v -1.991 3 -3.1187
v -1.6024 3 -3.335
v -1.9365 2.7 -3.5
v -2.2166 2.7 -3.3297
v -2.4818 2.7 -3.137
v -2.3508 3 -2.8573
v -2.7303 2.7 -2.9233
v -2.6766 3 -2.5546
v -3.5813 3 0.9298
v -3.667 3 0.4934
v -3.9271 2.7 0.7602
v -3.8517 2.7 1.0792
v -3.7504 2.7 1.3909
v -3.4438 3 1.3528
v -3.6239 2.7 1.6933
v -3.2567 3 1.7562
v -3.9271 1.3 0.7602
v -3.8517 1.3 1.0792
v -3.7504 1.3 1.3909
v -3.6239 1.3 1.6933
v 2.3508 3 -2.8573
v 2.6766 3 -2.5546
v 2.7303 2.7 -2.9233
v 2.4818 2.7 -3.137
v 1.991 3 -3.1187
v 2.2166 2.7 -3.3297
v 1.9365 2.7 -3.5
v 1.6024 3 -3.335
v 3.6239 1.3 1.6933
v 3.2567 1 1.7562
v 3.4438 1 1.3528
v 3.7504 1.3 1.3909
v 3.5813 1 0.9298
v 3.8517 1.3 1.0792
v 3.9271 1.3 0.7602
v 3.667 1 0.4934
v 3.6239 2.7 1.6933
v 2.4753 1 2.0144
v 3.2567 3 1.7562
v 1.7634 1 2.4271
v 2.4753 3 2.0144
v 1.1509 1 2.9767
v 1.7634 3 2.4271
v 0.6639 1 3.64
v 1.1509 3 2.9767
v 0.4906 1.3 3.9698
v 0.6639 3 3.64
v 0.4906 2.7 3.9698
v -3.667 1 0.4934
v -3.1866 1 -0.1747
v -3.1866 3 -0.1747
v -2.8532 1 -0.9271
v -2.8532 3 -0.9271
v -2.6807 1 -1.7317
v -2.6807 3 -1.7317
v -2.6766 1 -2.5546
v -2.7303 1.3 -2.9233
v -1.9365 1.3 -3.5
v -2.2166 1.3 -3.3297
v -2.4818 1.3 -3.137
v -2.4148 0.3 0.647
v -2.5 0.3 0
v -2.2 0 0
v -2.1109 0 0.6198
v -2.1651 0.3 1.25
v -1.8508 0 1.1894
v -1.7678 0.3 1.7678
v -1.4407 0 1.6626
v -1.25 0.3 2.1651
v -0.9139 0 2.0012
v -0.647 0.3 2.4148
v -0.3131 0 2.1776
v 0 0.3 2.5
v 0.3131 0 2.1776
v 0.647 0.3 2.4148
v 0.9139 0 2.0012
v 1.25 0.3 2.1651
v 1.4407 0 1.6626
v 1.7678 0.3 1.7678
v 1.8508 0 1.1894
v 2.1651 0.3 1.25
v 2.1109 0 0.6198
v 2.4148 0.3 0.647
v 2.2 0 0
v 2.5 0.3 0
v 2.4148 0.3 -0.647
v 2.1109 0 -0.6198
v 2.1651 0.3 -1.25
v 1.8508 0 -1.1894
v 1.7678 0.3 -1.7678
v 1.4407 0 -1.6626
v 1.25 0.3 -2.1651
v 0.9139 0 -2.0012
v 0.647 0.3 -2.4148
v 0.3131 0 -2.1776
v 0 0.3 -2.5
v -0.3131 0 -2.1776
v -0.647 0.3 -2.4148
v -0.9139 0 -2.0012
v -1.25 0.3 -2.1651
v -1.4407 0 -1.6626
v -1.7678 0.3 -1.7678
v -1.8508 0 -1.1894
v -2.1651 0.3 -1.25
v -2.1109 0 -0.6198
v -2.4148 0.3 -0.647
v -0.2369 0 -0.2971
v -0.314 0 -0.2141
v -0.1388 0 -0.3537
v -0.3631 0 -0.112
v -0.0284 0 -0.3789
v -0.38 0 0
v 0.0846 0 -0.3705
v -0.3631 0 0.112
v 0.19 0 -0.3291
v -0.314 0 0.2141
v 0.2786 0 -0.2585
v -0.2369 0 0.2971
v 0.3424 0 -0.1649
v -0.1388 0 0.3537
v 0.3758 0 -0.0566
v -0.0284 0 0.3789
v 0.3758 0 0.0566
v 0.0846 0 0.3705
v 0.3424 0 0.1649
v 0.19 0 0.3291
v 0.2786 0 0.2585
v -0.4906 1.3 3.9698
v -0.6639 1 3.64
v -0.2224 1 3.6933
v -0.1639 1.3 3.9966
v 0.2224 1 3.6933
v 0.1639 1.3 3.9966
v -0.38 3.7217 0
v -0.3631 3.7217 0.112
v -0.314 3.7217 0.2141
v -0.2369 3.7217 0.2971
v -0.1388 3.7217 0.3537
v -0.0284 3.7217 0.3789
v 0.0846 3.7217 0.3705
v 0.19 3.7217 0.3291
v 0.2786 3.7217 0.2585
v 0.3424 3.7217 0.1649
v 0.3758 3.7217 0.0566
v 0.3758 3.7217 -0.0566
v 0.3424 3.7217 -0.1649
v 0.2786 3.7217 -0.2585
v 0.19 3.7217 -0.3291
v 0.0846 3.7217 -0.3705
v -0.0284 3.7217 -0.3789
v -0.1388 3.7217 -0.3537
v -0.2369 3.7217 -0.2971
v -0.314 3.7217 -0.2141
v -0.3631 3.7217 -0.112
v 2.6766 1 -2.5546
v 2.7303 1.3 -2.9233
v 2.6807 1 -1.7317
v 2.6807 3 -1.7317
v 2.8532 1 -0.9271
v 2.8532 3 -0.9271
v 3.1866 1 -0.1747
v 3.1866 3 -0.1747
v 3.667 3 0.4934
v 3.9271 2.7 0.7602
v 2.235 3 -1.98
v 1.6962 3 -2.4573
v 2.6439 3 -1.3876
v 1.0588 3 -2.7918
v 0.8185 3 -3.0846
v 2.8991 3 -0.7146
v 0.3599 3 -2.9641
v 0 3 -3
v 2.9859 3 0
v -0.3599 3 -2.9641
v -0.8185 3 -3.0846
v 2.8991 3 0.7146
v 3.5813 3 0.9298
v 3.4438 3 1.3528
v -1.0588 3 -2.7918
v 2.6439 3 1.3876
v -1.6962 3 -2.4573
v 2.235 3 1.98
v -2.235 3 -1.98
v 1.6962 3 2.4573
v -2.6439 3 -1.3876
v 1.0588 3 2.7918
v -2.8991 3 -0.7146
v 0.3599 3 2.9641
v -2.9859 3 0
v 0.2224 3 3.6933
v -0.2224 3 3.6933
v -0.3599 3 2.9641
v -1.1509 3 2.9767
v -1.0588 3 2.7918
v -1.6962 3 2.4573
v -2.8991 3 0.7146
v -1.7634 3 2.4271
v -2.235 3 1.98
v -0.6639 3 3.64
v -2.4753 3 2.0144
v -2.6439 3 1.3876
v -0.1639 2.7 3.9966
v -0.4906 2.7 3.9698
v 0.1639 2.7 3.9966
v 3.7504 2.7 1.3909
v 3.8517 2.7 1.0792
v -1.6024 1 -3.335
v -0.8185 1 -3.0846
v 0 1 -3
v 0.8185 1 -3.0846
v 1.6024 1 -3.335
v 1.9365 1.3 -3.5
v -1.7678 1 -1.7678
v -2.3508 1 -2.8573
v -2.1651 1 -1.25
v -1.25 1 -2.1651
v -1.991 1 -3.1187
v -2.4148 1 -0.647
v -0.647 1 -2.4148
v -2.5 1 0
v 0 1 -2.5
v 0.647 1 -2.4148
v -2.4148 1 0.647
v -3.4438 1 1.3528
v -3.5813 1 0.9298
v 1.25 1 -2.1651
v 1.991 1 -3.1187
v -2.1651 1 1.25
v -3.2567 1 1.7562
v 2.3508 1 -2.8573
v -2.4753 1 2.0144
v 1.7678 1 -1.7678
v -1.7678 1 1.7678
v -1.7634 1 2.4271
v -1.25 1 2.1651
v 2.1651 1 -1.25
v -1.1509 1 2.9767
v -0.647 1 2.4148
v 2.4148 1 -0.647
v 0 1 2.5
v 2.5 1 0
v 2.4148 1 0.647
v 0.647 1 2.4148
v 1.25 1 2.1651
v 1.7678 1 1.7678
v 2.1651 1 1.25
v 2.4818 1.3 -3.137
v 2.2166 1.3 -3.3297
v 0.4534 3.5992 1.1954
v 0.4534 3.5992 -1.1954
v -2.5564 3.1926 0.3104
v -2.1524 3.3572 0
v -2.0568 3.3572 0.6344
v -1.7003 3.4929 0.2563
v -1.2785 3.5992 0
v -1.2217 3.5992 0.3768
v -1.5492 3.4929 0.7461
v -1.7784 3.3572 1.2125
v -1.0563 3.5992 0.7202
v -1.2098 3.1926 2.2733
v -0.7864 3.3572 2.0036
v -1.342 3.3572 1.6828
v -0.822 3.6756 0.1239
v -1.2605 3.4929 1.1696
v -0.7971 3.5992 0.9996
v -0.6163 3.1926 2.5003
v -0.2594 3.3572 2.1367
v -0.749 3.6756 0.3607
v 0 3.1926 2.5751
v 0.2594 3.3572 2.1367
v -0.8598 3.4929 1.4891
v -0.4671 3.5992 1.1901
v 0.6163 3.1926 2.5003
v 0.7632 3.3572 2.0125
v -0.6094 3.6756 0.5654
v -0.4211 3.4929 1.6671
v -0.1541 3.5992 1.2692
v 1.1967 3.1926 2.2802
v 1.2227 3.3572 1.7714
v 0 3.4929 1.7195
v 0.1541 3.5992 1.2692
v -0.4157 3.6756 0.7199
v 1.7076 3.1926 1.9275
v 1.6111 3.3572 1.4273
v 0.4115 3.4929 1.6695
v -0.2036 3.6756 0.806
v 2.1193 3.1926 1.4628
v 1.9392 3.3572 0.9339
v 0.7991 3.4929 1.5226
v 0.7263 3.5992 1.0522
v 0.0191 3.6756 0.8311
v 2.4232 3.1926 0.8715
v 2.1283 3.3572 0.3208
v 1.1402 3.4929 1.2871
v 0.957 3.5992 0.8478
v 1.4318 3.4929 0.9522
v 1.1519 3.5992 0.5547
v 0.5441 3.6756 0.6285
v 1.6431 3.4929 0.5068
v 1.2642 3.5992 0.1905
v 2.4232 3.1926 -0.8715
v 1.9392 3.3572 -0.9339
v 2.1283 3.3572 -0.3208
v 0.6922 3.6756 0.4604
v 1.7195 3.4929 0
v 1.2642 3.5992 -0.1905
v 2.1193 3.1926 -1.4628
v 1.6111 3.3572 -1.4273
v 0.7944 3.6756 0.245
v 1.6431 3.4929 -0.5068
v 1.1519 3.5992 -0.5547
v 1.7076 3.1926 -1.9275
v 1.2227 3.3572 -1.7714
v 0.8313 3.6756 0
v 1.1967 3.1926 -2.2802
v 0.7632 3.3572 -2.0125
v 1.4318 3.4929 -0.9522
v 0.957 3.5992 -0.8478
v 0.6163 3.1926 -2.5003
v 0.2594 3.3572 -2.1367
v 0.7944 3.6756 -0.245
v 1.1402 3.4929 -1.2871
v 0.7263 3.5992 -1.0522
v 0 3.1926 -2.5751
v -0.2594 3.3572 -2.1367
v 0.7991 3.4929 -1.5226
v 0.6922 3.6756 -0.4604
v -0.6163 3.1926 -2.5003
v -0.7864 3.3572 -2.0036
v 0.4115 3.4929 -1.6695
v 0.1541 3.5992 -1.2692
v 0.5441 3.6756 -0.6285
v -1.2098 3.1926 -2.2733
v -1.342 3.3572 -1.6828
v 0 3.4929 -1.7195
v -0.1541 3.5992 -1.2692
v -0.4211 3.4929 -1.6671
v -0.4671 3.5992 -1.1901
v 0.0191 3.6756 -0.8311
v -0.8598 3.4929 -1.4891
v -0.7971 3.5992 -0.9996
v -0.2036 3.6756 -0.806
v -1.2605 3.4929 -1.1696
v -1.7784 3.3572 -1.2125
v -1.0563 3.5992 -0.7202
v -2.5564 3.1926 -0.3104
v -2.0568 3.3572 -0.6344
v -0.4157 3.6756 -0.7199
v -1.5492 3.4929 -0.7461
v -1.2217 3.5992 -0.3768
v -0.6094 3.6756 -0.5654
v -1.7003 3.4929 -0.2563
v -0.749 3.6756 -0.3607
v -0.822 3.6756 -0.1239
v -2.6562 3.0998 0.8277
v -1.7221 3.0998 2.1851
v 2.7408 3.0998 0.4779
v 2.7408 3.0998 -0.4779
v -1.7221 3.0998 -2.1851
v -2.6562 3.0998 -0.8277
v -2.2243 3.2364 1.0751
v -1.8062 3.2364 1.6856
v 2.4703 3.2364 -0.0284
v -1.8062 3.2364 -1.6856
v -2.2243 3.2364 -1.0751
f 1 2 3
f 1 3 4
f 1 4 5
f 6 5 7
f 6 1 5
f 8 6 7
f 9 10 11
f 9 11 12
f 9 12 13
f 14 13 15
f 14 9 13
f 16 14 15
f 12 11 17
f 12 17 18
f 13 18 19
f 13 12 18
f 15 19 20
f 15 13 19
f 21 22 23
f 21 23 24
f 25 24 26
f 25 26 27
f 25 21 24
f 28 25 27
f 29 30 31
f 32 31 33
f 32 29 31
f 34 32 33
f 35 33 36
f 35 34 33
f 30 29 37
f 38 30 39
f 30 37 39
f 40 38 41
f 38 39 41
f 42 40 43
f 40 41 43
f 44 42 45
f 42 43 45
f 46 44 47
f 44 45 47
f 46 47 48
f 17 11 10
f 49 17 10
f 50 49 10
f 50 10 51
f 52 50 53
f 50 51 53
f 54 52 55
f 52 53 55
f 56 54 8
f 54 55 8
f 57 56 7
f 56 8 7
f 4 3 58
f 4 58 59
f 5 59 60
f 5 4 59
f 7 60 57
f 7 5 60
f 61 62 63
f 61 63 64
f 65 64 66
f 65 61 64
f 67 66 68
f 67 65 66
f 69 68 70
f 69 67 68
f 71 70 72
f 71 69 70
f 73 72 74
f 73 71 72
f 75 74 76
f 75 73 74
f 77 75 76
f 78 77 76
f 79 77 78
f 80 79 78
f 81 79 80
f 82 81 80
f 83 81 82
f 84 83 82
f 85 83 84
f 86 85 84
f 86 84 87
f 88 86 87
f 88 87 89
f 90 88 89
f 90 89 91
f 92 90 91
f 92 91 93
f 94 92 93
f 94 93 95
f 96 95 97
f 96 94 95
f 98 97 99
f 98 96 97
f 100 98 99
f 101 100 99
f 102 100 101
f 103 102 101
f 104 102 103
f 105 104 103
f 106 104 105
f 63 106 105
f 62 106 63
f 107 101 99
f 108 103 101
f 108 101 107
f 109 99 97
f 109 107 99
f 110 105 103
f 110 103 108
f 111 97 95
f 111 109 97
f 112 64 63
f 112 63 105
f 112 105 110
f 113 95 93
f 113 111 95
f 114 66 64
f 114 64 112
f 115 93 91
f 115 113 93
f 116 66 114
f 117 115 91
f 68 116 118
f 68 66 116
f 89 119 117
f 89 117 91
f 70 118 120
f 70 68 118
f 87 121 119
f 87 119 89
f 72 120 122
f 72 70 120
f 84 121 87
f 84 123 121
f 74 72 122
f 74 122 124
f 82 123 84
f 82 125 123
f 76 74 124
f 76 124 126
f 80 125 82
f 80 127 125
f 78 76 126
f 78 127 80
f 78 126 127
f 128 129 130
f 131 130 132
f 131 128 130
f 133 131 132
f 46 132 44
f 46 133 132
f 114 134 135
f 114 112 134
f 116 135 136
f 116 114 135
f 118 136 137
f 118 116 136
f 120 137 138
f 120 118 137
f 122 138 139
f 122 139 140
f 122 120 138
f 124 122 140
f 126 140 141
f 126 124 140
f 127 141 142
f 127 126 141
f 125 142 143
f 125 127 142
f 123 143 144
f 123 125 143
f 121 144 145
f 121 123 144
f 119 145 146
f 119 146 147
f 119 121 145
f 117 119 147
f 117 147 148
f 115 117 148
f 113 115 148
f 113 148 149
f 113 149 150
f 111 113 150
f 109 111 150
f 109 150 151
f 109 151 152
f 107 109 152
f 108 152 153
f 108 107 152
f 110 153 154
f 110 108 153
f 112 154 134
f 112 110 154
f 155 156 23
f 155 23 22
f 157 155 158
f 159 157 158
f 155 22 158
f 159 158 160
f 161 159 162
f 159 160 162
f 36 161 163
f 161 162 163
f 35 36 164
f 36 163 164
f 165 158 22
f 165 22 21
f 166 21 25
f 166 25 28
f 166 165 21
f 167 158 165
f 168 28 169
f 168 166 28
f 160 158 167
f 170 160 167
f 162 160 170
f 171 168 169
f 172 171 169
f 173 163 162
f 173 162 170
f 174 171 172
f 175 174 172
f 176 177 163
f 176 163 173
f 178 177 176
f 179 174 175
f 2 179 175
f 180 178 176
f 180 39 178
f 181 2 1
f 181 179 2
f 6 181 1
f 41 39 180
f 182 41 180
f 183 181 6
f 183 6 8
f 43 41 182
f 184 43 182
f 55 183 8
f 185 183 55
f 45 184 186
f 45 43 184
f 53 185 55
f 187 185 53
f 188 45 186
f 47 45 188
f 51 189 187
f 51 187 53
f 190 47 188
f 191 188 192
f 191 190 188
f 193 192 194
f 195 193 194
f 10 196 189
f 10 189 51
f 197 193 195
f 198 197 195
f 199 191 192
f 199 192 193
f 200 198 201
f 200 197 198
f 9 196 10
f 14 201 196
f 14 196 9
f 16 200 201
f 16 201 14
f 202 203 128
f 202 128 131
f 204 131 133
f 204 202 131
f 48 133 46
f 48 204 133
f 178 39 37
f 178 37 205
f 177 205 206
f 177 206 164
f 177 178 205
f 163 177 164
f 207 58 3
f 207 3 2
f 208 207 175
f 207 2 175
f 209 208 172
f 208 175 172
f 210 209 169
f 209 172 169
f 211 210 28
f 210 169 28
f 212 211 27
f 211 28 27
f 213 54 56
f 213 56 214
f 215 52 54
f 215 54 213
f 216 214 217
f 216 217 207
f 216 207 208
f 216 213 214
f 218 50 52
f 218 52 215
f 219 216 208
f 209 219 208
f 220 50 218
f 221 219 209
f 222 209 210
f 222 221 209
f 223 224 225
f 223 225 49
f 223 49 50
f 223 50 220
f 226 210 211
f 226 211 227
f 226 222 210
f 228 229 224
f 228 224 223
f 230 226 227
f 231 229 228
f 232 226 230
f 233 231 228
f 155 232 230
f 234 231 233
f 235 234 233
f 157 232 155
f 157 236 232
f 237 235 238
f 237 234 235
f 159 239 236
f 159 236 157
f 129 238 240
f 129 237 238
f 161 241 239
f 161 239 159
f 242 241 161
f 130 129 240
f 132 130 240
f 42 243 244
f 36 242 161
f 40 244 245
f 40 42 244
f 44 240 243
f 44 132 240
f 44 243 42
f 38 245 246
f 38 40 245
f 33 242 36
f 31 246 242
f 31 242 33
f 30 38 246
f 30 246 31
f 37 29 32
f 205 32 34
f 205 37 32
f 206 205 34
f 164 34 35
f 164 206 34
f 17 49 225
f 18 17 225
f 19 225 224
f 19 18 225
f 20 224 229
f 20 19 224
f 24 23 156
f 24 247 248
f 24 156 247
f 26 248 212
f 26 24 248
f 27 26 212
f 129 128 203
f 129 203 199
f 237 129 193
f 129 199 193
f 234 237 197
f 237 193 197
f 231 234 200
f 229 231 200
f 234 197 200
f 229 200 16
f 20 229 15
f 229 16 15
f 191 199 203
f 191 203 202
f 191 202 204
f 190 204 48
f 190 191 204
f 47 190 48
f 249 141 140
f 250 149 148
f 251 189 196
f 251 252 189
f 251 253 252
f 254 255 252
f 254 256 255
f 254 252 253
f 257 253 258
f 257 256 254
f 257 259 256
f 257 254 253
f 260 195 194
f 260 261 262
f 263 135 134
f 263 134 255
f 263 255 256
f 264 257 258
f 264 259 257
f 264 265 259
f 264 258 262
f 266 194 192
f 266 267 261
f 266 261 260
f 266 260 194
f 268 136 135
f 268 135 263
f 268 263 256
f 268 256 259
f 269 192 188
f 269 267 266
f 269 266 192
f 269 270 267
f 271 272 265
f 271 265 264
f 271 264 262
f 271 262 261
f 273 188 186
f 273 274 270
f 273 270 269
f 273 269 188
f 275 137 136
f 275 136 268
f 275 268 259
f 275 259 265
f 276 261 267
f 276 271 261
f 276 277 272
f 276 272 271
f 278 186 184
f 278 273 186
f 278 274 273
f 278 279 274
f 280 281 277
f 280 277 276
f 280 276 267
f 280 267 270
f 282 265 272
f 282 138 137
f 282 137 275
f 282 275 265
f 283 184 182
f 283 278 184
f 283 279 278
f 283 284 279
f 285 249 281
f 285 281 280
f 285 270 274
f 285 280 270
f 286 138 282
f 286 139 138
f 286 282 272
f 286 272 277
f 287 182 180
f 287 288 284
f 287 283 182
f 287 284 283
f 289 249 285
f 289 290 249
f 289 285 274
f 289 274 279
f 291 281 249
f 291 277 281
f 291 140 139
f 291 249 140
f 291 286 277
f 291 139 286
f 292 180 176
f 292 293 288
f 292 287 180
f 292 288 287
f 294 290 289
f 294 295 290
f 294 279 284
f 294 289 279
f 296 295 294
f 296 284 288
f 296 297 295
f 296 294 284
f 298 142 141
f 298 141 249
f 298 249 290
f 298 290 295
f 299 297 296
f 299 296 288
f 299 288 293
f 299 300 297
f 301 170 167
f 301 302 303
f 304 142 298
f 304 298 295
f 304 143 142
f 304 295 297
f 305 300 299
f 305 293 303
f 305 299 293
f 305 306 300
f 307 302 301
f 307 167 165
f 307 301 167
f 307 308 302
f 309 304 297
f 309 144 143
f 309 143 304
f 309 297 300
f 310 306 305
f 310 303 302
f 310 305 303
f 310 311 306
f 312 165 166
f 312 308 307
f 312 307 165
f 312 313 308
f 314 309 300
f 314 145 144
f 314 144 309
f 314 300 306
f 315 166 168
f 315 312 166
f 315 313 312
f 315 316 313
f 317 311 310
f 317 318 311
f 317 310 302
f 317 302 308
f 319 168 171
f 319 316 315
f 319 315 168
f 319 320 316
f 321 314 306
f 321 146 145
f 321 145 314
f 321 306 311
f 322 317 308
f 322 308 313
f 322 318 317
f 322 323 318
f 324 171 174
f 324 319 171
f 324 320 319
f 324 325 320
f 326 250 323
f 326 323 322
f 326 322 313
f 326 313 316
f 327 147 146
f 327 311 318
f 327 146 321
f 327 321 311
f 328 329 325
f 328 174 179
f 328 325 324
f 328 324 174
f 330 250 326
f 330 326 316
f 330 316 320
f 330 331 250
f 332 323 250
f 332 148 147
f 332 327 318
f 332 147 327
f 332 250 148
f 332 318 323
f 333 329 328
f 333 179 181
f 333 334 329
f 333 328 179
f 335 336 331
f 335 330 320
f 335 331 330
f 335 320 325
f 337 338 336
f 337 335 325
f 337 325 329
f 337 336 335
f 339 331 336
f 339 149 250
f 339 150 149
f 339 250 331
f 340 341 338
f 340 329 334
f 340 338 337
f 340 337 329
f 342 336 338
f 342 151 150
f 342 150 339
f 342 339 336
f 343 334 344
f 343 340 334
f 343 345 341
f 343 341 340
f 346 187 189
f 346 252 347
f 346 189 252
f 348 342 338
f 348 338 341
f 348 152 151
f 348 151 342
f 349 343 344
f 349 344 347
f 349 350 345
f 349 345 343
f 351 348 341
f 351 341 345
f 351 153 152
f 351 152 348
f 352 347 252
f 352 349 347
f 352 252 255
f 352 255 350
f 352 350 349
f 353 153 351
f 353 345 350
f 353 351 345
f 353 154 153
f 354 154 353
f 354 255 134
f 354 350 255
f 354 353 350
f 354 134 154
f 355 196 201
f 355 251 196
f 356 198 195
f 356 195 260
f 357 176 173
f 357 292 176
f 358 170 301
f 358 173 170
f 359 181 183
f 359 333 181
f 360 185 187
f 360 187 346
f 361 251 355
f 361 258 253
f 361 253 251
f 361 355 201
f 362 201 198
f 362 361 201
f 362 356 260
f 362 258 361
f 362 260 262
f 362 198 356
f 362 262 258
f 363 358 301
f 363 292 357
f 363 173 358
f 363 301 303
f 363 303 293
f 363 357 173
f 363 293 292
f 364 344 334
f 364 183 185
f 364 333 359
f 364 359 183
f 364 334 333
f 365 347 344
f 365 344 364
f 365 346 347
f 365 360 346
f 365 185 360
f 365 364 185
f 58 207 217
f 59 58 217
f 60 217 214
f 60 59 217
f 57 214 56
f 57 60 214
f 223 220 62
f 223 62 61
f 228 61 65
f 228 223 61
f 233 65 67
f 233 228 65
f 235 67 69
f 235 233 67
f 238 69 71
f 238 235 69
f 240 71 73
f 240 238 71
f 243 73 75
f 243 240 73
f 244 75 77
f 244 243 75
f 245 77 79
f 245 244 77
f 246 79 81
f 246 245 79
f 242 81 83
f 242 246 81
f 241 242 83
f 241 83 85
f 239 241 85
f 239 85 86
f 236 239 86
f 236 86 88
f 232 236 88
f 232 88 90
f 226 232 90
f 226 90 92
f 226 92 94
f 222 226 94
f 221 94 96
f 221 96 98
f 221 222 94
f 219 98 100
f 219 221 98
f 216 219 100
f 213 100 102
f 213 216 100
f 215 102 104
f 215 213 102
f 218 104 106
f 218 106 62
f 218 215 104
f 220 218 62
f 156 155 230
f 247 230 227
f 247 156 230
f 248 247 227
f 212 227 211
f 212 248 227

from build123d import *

# Parameters (mm, degrees)
CHANFREIN1_SIZE              = 0.3
ESQUISSE2_R                  = 4
ENL_V_MAT_EXTRU_1_DEPTH      = 2
R_P_TITION_CIRCULAIRE1_COUNT = 5


with BuildPart() as part:
    # Esquisse1 → Révolution1 (revolve)
    with BuildSketch(Plane.XY):
        with BuildLine():
            Line((-0.38, 0), (-2.5, 0))
            Line((-2.5, 0), (-2.5, 1))
            Line((-2.5, 1), (-4, 1))
            Line((-4, 1), (-4, 3))
            Line((-4, 3), (-2.985871259, 3))
            ThreePointArc((-2.985871259, 3), (-1.71951066, 3.492907341), (-0.38, 3.721682356))
            Line((-0.38, 3.721682356), (-0.38, 3))
            Line((-0.38, 3), (-0.38, 0))
        make_face()
    revolve(axis=Axis((0, 0, 0), (0, 1, 0)))

    # Chanfrein1
    chanfrein1_edges = [part.edges().sort_by_distance(p)[0] for p in [
        (2.5, 0, 0),
        (4, 3, 0),
        (4, 1, 0),
    ]]
    chamfer(chanfrein1_edges, length=CHANFREIN1_SIZE)

    # Esquisse2 → Enlèv. mat.-Extru.1 (cut)
    with BuildSketch(Plane(origin=(0, 3, 0), x_dir=(1, 0, 0), z_dir=(0, 1, 0))):
        with Locations((0, 7)):
            Circle(ESQUISSE2_R)
    enl_v_mat_extru_1 = extrude(amount=-ENL_V_MAT_EXTRU_1_DEPTH, mode=Mode.SUBTRACT)

    # Répétition circulaire1: Enlèv. mat.-Extru.1 ×5 about axis
    r_p_tition_circulaire1_axis = Axis((0, 0, 0), (0, 1, 0))
    for i in range(1, R_P_TITION_CIRCULAIRE1_COUNT):
        add(enl_v_mat_extru_1.rotate(r_p_tition_circulaire1_axis, i * 360 / R_P_TITION_CIRCULAIRE1_COUNT), mode=Mode.SUBTRACT)


solid = part.part
